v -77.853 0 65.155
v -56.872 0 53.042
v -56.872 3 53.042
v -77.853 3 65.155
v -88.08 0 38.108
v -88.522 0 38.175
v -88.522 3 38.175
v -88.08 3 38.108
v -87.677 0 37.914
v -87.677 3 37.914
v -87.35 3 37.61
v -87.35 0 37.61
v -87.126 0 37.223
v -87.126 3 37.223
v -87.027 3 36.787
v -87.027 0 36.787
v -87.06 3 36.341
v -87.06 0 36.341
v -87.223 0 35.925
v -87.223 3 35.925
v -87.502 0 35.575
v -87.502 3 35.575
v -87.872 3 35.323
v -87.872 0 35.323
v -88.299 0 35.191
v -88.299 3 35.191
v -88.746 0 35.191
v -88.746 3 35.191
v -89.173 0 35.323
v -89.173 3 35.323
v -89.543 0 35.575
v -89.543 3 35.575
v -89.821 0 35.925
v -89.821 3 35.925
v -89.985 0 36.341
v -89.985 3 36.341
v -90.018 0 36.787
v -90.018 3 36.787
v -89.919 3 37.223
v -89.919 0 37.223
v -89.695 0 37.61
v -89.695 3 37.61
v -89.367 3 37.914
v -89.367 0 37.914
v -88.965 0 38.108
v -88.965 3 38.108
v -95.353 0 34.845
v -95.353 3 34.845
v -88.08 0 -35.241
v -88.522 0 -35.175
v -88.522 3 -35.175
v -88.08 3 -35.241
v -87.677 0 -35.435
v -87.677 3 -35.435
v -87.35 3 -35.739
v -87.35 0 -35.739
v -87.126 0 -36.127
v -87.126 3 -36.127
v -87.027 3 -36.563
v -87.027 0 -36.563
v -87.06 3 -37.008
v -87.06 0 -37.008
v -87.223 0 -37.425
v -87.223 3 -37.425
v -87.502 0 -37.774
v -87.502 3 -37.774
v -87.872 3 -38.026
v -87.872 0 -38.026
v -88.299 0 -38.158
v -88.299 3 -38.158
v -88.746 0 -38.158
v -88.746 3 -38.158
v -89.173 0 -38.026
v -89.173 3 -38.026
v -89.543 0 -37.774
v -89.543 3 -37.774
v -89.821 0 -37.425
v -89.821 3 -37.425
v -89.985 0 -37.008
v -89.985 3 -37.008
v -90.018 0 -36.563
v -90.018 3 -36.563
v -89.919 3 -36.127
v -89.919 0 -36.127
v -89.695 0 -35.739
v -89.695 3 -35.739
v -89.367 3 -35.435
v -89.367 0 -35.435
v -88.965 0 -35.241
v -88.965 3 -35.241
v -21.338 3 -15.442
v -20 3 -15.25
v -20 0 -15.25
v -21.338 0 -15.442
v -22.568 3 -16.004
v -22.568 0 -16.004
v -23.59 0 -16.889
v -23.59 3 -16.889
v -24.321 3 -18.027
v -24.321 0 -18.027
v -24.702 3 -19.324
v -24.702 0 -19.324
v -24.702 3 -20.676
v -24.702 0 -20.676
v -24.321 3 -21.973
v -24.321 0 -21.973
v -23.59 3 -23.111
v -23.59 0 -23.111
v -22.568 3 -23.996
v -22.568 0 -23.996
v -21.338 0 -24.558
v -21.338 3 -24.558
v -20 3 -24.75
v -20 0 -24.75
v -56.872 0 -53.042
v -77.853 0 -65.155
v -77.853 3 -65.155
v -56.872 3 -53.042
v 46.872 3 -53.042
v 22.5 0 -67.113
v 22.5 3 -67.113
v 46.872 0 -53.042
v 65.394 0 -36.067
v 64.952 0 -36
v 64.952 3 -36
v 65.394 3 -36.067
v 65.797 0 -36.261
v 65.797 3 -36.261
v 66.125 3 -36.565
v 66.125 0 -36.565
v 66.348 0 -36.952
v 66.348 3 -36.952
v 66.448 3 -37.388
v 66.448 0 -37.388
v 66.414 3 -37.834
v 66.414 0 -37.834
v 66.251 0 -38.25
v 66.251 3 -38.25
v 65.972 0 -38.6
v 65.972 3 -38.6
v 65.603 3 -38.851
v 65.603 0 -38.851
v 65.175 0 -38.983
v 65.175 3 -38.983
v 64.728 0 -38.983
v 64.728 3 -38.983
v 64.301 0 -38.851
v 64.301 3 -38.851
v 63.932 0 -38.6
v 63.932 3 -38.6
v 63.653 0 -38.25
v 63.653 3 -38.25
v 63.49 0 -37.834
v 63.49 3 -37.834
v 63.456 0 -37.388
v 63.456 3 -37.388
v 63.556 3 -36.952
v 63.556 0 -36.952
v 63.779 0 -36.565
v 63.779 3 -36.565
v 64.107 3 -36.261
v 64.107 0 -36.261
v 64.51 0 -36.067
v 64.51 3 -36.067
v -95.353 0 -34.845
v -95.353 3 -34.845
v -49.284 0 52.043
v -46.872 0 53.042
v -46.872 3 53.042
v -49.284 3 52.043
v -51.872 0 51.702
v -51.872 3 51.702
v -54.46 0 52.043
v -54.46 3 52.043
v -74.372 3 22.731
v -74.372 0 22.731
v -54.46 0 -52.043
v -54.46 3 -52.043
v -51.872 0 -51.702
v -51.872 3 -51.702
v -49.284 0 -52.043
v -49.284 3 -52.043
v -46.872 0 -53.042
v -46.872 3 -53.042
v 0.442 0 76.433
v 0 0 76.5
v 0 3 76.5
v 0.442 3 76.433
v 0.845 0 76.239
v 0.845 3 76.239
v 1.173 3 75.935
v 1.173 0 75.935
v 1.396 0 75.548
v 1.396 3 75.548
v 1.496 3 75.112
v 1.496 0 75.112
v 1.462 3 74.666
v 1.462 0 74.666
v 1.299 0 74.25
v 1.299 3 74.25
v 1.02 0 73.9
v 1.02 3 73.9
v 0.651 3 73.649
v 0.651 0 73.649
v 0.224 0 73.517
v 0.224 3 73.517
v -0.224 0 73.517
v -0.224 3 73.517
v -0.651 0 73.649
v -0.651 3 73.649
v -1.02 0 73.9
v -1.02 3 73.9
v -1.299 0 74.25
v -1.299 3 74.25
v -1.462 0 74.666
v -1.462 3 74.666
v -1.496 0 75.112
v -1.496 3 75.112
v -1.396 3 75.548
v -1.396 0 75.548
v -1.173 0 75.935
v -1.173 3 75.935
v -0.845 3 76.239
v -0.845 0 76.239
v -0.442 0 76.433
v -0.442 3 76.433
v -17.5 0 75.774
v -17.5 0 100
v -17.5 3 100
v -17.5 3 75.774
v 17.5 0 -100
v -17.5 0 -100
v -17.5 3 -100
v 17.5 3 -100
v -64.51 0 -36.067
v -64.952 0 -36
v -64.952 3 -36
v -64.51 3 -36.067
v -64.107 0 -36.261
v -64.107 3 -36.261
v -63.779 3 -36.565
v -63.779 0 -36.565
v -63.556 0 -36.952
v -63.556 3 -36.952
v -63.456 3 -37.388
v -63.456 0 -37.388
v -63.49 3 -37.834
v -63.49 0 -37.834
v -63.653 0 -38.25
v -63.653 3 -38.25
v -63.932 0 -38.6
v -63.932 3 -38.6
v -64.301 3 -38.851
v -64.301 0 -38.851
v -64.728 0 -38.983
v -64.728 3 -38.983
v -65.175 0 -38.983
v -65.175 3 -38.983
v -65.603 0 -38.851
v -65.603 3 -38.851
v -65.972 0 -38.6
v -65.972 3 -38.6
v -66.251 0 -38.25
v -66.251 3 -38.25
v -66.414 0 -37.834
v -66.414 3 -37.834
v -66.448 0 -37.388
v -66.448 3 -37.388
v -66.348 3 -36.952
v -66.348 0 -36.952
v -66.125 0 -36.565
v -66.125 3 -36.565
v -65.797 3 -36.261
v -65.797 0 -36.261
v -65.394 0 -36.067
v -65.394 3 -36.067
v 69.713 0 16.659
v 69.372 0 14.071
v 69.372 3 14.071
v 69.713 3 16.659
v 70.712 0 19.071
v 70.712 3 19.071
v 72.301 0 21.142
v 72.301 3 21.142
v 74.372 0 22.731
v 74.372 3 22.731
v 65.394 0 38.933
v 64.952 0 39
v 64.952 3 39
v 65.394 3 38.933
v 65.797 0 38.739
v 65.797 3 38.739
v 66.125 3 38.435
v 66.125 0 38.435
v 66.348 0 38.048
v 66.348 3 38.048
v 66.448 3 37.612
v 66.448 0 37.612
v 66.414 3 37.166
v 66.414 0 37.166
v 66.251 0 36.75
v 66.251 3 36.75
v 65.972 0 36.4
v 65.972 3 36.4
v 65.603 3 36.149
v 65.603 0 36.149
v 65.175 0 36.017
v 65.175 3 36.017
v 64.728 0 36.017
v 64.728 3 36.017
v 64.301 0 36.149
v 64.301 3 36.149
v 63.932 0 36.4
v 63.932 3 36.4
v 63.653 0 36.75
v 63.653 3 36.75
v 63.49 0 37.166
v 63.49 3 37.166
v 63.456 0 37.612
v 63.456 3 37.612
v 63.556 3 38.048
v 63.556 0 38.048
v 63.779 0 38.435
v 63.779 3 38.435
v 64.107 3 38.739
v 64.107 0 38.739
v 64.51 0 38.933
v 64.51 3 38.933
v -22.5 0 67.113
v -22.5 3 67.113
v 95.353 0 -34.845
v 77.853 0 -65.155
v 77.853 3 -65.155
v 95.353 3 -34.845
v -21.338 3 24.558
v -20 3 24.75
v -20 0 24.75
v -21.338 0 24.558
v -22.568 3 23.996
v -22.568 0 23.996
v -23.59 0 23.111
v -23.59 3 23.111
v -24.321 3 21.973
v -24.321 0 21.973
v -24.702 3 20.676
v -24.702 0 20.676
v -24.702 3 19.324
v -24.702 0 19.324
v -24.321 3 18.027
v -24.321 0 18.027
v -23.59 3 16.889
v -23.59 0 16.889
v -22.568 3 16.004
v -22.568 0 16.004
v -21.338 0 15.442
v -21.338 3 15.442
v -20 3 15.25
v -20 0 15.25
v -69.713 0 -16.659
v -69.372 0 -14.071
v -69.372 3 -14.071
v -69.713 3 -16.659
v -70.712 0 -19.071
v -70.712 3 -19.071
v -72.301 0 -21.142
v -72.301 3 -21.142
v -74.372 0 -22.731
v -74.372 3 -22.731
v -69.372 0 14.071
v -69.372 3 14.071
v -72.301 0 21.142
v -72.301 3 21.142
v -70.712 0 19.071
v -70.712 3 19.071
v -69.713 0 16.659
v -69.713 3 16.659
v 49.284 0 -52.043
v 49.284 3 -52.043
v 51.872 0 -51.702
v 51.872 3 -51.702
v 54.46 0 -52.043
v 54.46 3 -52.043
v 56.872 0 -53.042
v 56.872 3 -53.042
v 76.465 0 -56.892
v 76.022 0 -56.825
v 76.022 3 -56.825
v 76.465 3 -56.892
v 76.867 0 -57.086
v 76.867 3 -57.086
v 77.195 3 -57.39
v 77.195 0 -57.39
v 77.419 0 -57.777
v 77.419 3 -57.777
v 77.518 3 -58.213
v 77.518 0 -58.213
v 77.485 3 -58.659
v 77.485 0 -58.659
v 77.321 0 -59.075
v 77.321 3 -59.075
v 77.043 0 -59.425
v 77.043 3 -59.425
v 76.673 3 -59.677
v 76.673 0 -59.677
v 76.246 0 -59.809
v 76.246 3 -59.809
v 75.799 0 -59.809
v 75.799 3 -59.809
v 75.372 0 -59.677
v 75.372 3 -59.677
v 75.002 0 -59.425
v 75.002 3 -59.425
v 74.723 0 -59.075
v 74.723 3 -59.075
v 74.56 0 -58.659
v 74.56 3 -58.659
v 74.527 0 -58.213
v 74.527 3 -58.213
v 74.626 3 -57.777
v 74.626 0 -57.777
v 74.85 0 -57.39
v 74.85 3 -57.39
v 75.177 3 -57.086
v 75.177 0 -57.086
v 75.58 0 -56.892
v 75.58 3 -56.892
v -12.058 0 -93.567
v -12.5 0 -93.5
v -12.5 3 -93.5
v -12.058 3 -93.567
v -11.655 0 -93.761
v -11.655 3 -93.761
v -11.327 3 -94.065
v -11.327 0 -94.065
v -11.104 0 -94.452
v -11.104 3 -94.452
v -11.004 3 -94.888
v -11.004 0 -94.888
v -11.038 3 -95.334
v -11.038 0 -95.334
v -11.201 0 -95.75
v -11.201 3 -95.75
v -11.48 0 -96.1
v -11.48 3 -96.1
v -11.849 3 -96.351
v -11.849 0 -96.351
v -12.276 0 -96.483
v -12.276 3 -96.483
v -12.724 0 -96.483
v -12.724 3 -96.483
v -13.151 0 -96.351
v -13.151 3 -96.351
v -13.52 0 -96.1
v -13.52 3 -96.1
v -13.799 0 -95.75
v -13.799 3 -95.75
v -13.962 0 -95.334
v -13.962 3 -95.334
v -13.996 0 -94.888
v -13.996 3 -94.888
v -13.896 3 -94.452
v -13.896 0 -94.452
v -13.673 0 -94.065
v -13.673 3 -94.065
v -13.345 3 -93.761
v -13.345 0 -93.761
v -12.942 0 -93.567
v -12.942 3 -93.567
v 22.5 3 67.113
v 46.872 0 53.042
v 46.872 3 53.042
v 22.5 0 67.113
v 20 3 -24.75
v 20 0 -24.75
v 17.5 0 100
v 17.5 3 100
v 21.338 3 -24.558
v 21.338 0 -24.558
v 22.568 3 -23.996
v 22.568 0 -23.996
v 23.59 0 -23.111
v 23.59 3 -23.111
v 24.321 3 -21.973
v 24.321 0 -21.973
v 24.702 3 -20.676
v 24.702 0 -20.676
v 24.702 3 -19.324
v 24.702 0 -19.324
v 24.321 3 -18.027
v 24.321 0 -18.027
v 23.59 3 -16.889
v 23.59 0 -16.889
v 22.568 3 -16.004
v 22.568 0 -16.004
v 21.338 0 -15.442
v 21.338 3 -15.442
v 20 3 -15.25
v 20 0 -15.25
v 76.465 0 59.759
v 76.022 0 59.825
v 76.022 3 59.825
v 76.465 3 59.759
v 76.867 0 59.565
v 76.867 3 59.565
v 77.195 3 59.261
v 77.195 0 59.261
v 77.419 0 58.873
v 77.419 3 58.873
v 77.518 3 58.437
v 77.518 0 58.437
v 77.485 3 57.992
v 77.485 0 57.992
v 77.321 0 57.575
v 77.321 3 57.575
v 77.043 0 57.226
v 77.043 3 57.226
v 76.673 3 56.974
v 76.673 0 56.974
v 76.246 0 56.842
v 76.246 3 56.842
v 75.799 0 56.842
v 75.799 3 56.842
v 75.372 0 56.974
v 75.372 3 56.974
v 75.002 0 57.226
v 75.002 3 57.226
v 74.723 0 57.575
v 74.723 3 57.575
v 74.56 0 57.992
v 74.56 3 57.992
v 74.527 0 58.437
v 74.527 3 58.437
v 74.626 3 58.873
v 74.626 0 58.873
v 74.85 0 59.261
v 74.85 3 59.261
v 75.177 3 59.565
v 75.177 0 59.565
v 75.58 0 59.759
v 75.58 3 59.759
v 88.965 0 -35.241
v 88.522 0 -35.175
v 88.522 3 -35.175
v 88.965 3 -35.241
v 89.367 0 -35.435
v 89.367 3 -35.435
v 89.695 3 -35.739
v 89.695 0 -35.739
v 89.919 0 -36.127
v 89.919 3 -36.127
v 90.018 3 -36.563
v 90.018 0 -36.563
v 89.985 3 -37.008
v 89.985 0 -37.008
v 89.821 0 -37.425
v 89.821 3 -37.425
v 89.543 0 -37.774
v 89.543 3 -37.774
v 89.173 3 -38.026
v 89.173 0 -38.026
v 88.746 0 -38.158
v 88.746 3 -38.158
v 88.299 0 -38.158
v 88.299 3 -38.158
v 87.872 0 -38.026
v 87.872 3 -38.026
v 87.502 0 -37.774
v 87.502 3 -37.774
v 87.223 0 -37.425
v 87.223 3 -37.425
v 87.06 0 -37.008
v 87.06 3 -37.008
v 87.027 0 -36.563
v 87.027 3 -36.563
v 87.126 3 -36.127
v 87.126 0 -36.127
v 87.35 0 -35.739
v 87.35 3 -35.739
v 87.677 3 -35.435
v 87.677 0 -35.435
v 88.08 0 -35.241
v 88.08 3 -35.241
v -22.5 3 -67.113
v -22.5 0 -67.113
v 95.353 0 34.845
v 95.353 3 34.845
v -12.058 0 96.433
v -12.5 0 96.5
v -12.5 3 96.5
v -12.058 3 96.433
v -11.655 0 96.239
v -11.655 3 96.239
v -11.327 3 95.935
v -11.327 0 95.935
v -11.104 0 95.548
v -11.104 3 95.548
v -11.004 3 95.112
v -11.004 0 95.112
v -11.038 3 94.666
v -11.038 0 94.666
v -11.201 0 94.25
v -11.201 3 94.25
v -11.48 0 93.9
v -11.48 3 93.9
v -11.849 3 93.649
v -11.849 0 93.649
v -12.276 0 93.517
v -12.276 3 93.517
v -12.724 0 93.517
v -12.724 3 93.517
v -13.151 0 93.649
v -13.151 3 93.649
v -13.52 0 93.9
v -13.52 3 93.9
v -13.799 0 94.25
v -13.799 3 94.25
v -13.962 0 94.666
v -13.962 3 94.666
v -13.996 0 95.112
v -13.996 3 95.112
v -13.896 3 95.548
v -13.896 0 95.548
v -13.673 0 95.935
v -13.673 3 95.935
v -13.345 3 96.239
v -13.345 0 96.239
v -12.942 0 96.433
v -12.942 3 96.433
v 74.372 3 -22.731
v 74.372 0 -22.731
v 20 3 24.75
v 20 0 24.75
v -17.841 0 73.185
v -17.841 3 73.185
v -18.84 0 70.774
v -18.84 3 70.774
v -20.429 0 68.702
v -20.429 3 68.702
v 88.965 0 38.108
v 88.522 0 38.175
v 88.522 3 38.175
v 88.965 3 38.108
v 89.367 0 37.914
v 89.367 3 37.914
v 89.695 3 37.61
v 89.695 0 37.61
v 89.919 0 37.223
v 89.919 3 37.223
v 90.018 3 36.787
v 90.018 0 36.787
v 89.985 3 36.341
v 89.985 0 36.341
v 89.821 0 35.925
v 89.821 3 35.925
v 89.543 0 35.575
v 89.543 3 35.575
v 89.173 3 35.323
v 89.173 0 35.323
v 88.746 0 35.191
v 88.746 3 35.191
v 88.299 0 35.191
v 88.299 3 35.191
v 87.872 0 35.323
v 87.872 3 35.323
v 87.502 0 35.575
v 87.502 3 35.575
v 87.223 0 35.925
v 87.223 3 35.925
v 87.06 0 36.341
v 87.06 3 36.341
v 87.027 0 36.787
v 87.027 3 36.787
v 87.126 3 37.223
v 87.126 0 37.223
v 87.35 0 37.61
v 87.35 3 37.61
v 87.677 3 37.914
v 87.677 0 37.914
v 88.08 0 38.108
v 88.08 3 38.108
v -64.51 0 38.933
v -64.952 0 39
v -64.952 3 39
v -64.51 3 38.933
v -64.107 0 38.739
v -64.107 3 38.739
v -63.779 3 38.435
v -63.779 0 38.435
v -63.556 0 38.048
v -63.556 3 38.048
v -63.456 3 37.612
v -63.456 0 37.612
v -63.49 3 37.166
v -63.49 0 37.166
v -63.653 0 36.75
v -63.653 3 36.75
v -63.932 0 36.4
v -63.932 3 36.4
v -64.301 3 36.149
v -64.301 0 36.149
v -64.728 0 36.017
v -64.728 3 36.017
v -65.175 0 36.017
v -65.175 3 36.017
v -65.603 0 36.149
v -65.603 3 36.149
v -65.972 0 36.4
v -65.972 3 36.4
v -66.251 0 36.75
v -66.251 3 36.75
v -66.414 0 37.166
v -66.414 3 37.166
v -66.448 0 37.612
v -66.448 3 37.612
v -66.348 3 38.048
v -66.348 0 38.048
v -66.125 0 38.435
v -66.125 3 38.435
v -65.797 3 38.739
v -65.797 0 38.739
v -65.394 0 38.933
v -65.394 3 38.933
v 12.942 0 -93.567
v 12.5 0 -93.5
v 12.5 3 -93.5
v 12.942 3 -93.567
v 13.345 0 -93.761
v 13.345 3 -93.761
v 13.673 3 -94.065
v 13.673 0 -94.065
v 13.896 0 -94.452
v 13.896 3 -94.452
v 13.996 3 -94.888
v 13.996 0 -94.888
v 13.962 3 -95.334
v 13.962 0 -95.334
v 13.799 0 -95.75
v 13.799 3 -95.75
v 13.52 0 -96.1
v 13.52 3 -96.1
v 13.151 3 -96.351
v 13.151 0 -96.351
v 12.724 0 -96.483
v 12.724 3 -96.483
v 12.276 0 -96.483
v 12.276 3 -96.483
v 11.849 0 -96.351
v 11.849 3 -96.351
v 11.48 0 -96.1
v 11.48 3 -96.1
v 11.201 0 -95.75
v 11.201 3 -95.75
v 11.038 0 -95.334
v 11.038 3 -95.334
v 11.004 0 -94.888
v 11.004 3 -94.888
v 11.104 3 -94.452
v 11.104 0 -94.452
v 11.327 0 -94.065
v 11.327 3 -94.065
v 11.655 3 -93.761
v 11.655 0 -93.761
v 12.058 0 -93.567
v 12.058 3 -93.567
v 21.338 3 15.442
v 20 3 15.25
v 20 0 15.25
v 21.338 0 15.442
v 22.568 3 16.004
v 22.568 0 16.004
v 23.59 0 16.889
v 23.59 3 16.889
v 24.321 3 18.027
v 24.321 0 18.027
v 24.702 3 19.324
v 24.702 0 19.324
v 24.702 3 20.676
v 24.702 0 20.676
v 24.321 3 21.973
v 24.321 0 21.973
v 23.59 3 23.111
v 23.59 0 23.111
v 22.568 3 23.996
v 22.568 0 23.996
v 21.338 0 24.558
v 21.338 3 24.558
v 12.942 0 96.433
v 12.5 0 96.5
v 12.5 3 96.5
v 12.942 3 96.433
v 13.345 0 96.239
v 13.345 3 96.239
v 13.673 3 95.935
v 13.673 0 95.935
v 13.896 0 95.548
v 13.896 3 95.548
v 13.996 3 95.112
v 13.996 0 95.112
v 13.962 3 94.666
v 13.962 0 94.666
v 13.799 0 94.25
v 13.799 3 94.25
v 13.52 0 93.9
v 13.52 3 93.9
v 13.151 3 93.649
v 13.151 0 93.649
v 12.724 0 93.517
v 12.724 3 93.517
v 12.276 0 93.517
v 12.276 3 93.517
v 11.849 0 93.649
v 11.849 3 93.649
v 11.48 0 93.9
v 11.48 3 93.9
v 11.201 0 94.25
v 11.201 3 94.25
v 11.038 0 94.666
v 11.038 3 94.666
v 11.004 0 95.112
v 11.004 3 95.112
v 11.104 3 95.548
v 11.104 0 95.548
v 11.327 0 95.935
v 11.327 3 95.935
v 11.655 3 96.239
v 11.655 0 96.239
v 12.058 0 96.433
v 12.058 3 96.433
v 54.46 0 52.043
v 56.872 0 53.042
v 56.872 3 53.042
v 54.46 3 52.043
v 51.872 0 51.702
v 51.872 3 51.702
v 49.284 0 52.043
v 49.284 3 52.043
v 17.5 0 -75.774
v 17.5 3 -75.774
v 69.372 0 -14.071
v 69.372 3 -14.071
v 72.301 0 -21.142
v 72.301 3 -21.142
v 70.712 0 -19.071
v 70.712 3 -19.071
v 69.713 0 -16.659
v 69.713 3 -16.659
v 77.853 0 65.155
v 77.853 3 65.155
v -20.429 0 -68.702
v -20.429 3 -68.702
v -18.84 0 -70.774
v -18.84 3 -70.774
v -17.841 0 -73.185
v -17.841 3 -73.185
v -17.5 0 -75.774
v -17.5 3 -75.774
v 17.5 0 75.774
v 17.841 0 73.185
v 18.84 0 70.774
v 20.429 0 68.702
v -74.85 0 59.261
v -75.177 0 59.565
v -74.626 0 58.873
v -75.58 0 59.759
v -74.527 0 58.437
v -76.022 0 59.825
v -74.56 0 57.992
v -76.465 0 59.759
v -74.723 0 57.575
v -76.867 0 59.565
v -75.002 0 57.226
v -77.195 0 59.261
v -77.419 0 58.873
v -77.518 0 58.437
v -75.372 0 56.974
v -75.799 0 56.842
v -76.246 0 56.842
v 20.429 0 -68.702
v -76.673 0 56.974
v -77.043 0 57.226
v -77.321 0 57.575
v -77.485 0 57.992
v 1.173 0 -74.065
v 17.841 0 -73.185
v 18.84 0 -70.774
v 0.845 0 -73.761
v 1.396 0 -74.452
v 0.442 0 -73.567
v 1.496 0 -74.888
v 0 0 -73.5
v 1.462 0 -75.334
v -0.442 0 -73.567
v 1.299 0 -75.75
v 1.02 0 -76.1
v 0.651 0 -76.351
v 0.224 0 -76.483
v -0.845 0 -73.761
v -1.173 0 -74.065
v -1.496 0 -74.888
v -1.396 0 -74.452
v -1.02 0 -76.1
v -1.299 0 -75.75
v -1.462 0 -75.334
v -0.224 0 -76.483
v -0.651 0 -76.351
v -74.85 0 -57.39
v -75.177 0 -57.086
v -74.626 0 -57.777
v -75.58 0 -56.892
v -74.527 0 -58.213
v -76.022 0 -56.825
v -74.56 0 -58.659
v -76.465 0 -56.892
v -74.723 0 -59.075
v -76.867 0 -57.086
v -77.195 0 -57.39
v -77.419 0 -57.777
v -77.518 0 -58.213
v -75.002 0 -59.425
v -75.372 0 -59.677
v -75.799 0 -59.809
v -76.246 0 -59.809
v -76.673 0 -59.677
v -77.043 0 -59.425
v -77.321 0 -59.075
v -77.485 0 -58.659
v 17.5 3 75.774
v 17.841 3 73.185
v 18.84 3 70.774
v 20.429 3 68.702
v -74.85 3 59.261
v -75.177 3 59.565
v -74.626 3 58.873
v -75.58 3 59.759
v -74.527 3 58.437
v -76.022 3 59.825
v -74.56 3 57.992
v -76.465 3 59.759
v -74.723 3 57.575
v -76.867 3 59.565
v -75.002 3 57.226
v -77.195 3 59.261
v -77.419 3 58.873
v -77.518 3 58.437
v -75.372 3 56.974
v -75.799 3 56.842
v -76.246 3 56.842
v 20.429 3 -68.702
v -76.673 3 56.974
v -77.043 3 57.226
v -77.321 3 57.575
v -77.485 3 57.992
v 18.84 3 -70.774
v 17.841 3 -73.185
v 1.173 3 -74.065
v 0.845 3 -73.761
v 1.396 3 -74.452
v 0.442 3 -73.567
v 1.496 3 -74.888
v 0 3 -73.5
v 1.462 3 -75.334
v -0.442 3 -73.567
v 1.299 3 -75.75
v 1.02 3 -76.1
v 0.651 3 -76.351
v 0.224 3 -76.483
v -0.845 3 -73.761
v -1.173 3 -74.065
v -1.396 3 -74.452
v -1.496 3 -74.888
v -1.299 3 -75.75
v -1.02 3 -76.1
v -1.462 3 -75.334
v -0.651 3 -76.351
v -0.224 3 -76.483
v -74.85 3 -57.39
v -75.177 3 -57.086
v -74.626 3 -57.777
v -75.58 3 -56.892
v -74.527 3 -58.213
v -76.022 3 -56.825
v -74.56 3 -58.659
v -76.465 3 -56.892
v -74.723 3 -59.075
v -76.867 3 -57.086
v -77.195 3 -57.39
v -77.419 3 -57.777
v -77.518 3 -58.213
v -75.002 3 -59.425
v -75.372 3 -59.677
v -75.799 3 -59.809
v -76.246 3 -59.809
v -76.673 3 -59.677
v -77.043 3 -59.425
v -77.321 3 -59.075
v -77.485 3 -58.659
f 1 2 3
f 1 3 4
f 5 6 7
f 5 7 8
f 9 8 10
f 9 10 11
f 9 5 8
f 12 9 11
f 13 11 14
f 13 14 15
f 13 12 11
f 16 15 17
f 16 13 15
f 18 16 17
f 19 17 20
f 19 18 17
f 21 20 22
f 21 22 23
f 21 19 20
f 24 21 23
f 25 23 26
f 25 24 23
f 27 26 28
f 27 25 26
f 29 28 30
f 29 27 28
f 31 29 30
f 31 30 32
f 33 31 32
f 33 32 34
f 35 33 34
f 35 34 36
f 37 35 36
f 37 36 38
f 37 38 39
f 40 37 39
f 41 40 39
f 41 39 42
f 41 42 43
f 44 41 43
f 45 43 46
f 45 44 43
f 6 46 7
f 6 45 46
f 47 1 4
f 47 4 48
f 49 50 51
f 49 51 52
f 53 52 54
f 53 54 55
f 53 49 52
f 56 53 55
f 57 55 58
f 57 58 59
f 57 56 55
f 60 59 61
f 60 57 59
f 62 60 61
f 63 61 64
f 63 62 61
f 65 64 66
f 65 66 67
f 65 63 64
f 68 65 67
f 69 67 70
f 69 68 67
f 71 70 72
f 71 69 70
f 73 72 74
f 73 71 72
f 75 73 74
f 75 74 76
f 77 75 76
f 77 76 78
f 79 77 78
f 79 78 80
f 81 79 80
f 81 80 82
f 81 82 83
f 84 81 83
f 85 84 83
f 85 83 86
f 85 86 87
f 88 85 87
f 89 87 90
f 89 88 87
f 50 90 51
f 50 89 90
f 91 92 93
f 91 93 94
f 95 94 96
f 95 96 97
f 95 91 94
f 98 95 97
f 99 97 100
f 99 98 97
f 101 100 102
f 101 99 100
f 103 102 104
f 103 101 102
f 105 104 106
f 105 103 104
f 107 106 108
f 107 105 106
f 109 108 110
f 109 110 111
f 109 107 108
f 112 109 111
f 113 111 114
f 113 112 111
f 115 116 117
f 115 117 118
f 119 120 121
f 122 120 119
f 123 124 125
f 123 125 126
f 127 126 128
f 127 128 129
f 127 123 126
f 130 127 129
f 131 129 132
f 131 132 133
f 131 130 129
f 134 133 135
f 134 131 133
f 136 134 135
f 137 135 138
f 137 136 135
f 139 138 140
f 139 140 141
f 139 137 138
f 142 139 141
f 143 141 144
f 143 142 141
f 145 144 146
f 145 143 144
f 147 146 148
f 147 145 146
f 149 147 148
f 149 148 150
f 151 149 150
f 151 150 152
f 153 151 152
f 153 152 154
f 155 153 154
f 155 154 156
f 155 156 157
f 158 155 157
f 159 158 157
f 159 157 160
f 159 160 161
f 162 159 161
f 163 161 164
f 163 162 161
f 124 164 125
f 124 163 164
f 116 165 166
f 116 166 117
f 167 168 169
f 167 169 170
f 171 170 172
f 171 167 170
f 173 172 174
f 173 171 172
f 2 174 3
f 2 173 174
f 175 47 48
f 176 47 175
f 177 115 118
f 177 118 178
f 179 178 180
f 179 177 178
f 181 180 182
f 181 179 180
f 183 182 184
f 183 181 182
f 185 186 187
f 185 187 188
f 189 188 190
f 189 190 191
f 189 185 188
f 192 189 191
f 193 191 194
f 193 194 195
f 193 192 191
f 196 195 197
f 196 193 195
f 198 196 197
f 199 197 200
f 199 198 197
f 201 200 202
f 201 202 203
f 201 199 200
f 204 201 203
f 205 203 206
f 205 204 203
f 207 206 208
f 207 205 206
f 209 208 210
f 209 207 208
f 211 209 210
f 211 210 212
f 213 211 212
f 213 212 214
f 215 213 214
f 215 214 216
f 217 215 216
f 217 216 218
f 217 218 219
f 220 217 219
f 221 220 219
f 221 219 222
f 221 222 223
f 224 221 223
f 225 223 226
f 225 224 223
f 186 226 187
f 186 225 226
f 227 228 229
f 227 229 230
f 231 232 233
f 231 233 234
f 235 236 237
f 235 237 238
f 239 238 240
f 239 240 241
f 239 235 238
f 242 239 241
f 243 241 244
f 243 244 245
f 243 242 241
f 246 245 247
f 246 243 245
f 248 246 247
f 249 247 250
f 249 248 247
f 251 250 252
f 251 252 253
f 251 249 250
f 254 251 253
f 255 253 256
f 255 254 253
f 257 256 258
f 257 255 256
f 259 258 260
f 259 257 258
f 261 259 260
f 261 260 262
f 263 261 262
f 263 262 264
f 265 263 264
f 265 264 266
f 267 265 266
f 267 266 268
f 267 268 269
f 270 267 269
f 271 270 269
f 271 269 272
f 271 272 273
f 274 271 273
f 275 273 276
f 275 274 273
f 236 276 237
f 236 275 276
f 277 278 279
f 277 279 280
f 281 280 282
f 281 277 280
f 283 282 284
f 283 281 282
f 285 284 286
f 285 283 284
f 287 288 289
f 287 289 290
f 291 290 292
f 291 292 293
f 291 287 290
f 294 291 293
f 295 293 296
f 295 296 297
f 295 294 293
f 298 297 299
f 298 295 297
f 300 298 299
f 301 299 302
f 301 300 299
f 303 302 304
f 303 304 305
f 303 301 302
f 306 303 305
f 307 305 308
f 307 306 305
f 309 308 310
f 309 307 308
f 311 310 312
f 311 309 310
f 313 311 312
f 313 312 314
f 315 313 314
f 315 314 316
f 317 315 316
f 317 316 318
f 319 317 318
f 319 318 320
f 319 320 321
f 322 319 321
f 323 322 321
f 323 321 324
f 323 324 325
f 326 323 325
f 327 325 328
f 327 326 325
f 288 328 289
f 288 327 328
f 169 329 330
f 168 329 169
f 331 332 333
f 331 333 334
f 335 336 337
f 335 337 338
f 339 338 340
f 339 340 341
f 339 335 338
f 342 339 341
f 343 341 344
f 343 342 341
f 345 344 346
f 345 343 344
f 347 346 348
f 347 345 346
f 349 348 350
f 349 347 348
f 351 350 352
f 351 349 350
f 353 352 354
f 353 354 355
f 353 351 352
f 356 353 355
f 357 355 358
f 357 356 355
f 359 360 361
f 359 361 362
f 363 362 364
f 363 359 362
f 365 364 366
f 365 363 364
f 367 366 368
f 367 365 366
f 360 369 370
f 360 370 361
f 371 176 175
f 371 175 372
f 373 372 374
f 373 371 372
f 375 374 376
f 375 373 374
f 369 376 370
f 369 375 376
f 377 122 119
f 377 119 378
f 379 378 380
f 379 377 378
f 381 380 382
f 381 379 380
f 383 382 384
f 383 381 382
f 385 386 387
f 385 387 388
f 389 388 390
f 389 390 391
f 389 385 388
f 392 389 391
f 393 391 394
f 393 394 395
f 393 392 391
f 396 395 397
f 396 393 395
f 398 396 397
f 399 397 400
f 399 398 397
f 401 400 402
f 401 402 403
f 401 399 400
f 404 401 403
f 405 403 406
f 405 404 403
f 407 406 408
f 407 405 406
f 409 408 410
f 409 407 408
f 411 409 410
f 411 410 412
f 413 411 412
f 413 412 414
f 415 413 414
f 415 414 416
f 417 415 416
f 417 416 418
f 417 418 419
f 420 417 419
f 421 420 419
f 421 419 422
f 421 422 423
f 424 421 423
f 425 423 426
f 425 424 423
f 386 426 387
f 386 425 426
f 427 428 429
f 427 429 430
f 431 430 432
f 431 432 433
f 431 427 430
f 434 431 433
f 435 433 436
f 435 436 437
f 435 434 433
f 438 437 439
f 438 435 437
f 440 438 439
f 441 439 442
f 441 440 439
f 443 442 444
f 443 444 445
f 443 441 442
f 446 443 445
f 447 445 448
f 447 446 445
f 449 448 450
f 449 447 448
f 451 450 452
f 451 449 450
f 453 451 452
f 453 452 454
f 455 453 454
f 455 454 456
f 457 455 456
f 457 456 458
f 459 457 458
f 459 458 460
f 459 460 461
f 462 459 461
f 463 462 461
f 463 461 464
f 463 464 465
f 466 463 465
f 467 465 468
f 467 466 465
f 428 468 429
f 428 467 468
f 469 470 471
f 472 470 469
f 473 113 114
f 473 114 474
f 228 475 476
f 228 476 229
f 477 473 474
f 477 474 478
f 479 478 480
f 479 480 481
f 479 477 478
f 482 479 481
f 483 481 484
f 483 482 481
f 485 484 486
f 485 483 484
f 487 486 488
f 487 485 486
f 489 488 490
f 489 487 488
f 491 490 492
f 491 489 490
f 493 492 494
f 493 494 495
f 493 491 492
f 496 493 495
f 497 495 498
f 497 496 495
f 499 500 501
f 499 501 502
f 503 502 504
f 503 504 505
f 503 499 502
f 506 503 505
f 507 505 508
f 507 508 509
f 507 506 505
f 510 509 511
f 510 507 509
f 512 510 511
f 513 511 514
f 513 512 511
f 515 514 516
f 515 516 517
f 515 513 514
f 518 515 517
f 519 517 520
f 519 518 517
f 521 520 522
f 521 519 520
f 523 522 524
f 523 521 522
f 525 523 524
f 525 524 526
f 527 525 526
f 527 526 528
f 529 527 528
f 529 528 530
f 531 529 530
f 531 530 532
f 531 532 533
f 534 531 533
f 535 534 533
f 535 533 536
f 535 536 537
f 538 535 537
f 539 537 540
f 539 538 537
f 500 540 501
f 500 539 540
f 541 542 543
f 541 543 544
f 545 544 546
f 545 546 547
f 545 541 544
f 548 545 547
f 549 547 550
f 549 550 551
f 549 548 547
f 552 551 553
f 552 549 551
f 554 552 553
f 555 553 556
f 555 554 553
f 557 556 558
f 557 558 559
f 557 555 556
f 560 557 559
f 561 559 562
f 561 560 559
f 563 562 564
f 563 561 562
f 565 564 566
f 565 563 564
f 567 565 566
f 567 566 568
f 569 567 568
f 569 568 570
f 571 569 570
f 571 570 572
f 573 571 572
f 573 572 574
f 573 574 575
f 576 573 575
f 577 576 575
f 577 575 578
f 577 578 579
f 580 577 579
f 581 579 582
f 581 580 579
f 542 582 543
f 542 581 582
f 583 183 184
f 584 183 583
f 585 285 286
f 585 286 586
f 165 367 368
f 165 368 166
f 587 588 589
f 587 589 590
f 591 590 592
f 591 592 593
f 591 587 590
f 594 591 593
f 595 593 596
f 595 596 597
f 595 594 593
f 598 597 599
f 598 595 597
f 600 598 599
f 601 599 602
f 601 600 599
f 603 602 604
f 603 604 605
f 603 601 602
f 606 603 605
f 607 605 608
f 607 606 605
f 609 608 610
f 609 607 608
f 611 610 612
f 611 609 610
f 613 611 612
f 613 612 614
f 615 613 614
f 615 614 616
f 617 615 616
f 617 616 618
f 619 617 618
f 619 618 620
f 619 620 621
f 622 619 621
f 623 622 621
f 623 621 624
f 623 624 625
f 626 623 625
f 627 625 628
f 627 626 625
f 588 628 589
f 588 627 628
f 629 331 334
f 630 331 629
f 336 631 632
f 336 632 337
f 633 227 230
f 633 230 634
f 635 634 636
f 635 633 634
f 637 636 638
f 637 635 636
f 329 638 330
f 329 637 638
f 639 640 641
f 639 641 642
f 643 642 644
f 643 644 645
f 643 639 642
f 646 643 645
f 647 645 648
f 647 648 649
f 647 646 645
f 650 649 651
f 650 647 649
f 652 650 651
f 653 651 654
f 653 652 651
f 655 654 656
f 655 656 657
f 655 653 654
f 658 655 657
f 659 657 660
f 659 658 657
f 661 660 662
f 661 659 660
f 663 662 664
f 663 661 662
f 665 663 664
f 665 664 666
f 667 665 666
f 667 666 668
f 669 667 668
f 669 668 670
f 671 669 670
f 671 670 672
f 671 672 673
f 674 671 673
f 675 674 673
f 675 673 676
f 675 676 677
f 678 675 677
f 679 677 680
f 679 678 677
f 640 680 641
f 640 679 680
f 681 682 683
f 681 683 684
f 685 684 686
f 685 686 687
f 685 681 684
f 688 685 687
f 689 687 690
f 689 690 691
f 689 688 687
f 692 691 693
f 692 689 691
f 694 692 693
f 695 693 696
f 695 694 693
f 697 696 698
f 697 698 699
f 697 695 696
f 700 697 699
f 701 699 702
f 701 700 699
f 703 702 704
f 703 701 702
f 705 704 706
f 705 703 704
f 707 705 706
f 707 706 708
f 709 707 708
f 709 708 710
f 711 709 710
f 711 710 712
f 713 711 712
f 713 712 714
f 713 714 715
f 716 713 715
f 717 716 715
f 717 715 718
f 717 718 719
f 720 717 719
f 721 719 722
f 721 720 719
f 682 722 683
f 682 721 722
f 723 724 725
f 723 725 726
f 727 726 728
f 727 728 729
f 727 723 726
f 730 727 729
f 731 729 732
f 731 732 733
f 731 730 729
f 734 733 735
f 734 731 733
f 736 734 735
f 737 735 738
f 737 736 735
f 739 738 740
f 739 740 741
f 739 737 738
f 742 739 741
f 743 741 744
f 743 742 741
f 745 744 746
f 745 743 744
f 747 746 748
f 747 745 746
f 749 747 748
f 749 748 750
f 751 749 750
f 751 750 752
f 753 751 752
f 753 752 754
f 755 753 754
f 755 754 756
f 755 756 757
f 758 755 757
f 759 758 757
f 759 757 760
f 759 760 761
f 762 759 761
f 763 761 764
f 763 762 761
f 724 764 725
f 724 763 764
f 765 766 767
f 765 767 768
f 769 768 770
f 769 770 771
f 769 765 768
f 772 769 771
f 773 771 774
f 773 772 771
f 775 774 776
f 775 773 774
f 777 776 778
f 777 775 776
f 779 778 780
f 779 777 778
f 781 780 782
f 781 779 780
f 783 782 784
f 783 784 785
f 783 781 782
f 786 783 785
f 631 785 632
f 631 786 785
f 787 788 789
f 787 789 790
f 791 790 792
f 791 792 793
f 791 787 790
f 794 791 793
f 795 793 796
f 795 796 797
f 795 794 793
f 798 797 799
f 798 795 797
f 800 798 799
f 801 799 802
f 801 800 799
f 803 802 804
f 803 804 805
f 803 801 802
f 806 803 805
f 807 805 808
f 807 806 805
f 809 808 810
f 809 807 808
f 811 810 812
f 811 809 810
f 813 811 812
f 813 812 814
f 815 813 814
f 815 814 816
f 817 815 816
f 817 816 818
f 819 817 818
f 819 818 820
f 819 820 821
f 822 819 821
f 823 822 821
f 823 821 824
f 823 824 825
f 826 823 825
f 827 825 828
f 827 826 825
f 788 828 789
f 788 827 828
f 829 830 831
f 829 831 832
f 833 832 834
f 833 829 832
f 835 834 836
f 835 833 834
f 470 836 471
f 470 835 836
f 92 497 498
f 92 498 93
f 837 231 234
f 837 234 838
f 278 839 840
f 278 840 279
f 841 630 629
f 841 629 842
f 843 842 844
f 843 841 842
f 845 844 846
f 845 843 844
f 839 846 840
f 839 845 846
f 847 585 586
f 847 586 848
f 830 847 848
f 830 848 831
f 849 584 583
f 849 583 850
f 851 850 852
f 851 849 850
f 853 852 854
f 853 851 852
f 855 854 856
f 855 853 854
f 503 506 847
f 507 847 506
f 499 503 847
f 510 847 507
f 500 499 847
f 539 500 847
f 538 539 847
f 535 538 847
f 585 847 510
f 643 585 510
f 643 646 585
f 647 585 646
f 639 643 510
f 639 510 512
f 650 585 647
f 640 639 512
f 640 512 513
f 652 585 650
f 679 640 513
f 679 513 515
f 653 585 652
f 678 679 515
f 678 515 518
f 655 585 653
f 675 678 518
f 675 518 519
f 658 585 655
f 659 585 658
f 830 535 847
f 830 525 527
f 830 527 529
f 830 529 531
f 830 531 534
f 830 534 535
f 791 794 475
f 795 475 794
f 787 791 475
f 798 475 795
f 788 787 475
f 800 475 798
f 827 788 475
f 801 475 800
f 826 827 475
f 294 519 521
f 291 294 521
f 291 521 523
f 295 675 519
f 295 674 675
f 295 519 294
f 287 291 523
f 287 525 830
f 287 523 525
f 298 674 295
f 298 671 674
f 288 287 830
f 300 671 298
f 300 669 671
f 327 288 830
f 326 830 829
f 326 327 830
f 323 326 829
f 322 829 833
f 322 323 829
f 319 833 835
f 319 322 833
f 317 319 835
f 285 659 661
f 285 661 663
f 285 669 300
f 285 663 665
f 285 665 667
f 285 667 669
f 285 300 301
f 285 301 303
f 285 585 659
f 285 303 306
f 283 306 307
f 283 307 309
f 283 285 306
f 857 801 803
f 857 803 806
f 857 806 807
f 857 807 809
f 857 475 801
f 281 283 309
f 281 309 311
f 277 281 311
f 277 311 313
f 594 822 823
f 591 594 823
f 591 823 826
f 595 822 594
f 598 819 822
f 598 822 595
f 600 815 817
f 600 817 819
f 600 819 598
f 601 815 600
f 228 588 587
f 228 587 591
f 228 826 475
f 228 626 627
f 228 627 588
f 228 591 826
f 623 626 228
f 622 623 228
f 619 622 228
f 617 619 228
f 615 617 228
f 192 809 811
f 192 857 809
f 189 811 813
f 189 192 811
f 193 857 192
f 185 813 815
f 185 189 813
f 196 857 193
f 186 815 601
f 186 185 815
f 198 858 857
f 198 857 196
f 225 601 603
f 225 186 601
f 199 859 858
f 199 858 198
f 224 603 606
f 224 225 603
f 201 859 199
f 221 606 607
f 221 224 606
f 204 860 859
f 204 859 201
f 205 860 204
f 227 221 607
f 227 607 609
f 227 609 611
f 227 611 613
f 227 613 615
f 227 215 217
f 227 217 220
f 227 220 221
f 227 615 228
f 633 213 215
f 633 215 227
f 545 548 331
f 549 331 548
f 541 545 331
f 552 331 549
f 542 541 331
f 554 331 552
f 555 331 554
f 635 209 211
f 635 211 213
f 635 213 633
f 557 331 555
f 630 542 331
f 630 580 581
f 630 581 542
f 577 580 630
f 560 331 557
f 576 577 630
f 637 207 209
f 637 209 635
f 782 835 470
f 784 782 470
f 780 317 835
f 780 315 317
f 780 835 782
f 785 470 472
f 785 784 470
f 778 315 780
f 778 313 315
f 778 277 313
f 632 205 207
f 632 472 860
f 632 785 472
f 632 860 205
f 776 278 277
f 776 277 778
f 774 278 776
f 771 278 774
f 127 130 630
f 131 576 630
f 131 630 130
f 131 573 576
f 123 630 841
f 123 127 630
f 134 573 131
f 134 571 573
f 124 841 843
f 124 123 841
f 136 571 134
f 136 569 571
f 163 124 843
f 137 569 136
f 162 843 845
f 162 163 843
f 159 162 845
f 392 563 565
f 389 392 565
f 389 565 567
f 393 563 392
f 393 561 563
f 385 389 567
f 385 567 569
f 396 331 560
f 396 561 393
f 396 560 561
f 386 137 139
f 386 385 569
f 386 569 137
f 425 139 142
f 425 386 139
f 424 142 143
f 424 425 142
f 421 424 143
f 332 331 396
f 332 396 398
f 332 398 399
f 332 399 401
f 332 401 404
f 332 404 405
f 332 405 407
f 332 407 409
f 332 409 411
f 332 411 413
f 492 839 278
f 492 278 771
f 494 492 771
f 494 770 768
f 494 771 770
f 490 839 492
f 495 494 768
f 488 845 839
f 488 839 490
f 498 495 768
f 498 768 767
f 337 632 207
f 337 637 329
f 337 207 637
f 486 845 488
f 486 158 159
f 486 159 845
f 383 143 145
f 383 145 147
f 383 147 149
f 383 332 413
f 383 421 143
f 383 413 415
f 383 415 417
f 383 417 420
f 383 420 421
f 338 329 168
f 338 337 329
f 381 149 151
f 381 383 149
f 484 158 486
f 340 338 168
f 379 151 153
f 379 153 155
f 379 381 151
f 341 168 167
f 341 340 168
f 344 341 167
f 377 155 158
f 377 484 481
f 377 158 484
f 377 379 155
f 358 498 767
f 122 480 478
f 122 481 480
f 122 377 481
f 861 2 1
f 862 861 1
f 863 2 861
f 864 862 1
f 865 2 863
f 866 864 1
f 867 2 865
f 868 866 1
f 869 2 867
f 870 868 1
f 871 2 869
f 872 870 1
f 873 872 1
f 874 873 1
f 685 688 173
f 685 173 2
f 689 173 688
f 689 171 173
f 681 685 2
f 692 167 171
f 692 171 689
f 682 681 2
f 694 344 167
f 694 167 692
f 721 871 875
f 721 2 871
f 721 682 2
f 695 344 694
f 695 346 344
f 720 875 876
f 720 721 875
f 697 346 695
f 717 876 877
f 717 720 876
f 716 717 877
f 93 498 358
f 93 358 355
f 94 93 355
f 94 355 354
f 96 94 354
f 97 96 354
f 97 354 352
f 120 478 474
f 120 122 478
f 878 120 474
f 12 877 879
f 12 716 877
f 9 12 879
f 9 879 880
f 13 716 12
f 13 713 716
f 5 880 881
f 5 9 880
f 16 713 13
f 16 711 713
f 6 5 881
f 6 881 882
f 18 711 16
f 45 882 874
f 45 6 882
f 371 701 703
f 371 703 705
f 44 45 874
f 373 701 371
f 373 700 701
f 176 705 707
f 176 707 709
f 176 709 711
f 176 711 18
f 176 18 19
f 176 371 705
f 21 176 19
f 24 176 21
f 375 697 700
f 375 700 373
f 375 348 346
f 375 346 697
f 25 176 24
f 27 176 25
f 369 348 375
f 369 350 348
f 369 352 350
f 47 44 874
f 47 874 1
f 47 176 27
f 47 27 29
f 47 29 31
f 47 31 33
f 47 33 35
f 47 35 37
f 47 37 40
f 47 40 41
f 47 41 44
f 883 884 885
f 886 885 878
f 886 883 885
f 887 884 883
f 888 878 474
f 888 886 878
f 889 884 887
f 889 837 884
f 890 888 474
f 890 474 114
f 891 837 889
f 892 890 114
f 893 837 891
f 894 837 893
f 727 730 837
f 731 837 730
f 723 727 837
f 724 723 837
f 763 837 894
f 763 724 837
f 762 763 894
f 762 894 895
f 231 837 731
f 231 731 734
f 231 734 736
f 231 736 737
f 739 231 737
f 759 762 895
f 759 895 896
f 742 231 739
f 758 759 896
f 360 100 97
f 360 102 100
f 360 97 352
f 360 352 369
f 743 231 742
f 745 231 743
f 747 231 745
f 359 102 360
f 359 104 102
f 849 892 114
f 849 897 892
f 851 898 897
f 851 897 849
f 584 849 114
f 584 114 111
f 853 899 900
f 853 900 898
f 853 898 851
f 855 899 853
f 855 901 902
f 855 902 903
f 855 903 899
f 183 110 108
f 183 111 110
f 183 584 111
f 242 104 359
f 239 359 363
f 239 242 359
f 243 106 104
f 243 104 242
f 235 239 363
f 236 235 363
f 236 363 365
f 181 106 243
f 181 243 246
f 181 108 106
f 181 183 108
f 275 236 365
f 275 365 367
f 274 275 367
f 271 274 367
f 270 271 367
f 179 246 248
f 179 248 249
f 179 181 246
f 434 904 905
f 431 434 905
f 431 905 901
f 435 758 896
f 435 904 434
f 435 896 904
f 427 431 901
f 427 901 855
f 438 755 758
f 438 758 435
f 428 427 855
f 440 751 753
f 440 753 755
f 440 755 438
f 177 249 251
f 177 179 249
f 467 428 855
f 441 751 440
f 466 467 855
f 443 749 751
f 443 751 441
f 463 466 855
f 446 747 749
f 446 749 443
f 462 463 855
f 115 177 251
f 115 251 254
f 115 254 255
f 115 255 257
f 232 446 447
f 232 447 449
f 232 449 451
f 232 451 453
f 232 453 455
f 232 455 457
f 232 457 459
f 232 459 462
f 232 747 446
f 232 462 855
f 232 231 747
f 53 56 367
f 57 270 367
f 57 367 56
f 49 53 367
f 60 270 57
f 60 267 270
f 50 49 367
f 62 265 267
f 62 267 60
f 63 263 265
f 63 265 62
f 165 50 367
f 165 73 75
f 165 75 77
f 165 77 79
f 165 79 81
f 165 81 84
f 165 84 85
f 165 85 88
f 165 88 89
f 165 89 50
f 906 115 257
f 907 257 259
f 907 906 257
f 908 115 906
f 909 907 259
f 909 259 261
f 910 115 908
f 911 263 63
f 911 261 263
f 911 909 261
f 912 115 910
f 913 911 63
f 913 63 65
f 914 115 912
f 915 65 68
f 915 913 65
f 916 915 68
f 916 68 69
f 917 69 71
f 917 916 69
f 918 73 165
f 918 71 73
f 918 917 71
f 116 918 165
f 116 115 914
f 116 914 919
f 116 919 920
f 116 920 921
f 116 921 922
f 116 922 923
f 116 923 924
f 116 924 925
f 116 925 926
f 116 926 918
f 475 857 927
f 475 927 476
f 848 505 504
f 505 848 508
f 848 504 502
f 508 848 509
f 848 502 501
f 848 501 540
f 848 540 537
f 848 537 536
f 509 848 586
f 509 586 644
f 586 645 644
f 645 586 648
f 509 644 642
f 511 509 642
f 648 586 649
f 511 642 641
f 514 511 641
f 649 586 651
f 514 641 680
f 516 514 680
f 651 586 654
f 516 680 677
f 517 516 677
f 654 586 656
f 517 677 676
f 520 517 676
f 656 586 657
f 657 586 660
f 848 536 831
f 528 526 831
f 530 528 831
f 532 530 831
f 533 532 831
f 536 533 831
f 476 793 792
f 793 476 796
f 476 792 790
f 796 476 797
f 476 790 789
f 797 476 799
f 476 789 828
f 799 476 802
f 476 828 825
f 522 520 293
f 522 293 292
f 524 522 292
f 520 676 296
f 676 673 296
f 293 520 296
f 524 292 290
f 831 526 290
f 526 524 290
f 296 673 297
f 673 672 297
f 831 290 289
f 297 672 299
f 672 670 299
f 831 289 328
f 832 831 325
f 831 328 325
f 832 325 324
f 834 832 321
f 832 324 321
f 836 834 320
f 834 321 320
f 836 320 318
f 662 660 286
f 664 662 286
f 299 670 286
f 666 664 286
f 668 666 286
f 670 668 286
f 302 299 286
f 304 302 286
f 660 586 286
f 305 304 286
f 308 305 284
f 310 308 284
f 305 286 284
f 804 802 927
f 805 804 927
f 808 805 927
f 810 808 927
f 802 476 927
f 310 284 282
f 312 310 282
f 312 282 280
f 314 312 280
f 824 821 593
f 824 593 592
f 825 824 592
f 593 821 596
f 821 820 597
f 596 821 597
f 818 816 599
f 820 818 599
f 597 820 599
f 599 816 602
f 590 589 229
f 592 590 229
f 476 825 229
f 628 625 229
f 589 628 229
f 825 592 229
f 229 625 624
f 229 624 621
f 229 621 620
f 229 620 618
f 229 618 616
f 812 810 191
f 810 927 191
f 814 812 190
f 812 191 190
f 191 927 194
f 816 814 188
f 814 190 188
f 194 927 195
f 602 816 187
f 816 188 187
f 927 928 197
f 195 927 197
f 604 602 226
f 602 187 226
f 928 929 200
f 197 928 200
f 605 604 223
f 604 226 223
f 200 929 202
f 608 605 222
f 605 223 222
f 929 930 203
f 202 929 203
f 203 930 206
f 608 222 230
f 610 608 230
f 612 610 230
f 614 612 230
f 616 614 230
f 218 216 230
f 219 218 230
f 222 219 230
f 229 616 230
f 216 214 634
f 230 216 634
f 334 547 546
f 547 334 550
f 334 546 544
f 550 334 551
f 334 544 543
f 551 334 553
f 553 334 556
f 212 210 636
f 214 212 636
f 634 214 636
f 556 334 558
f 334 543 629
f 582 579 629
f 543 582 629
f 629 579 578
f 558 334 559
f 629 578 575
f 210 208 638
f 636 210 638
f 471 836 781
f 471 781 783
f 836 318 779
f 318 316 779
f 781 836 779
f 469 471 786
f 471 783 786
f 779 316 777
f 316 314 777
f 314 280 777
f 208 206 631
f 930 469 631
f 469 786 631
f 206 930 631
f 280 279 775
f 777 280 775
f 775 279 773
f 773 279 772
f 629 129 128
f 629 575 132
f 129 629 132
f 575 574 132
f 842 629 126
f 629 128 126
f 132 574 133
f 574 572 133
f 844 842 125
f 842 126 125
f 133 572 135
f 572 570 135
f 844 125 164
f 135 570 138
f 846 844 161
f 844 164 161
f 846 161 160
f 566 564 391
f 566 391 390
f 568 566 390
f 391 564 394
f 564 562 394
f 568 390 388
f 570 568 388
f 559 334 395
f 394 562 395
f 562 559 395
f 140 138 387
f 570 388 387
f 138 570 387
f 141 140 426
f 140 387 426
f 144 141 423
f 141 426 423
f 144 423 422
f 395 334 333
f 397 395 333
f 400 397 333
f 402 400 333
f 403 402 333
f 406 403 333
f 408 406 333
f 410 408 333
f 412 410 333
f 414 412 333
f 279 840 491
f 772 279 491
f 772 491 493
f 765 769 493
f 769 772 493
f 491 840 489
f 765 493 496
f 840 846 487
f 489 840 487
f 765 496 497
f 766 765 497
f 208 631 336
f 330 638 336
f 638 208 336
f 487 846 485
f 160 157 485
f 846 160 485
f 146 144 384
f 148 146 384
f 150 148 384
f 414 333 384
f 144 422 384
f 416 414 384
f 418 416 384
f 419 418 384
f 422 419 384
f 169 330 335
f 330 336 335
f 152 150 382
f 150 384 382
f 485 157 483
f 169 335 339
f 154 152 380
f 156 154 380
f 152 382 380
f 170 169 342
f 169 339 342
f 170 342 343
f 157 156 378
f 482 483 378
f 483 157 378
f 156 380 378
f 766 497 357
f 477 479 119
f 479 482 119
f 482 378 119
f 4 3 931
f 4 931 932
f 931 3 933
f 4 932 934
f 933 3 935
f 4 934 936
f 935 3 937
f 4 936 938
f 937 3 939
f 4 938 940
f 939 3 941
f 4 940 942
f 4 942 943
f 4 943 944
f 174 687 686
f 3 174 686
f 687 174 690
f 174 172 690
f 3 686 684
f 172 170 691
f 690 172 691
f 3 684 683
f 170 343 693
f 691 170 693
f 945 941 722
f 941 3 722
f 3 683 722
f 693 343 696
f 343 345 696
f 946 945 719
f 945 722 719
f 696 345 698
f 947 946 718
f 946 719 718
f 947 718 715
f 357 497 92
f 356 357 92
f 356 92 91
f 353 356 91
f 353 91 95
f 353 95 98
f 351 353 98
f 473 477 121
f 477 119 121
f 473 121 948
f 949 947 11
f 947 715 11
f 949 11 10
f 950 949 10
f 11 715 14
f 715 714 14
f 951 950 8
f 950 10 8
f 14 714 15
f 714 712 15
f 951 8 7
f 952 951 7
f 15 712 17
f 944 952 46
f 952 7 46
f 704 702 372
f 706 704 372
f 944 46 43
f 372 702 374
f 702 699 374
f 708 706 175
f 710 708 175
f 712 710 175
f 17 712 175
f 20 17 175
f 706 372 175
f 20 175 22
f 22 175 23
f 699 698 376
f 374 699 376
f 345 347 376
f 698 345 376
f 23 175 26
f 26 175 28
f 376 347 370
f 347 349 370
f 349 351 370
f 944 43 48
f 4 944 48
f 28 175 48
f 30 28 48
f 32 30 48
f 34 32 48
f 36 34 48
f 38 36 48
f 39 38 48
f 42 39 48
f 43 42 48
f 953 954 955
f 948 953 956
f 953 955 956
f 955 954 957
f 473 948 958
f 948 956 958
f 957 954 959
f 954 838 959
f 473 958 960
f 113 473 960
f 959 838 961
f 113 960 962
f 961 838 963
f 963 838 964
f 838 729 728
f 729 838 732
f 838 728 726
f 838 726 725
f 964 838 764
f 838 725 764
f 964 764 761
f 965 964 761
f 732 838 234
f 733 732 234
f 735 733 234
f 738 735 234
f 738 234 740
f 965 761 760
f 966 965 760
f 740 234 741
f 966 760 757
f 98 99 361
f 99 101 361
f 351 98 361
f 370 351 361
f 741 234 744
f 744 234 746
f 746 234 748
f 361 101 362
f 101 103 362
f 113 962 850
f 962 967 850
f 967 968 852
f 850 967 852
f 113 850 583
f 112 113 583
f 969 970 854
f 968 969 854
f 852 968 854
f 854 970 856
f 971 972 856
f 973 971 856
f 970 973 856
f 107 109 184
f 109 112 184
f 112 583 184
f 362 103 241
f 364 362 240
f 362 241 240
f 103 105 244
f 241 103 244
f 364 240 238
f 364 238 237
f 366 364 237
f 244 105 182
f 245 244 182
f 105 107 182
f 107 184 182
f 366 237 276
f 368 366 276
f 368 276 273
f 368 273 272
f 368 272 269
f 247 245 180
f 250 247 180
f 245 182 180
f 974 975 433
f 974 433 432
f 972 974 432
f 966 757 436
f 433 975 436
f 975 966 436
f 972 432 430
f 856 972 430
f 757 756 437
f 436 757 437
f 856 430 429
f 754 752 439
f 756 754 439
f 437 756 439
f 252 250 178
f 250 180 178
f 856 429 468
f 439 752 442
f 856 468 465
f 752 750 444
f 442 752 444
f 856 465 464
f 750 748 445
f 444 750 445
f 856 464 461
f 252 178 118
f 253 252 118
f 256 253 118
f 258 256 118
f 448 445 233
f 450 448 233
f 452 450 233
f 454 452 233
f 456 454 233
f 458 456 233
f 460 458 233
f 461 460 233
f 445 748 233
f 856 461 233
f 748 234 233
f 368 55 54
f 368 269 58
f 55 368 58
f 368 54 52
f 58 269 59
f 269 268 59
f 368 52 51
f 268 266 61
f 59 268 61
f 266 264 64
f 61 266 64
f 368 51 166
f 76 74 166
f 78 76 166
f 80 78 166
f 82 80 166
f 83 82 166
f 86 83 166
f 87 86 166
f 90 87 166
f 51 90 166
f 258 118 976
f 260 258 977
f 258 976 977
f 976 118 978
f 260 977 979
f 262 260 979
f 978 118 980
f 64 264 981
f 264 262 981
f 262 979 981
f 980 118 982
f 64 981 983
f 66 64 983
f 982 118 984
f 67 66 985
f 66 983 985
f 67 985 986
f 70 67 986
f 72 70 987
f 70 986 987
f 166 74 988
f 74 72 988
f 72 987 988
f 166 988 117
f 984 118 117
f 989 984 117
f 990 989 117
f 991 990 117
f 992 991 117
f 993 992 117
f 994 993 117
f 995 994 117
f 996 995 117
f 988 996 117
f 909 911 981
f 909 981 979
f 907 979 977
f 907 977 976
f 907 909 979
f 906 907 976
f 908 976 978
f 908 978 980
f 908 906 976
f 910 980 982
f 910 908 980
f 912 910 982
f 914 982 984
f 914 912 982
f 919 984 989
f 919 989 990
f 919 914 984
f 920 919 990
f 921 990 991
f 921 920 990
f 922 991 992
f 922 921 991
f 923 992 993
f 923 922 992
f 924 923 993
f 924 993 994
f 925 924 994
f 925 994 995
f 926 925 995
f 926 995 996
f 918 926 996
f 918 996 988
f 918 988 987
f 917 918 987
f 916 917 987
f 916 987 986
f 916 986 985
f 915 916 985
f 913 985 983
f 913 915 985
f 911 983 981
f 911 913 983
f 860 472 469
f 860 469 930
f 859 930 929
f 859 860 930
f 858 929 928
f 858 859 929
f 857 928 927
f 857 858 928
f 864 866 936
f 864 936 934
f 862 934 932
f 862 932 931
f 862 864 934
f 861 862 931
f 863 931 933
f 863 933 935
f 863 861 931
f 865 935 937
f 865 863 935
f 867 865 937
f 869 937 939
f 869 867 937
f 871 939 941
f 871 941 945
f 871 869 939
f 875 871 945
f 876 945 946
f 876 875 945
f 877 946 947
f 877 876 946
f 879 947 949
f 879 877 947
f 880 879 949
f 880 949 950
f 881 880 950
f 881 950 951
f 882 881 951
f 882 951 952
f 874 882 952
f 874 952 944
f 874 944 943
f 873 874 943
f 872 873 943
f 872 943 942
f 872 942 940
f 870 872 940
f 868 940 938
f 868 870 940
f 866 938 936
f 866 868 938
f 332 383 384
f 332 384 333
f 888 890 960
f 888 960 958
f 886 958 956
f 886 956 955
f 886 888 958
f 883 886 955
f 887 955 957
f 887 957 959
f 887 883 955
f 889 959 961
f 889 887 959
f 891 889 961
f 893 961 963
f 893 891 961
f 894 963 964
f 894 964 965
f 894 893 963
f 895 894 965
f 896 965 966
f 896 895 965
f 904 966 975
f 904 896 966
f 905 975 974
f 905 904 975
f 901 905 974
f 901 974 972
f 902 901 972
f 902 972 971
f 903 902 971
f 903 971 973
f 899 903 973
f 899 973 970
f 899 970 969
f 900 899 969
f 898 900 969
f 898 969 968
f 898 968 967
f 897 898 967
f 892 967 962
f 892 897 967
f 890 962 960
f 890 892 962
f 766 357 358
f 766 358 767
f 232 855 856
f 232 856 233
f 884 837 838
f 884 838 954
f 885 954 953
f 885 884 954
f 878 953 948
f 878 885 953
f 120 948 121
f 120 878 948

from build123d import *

# Parameters (mm, degrees)
IZIM1_R                     = 1.5
Y_KSEKLIK_EKSTR_ZYON1_DEPTH = 3
KES_EKSTR_ZYON1_DEPTH       = 3


with BuildPart() as part:
    # Çizim1 → Yükseklik-Ekstrüzyon1 (new body)
    with BuildSketch(Plane(origin=(0, 0, 0), x_dir=(1, 0, 0), z_dir=(0, 1, 0))):
        with BuildLine():
            Line((-17.5, 100), (17.5, 100))
            Line((17.5, 100), (17.5, 75.773502692))
            ThreePointArc((17.5, 75.773502692), (18.839745962, 70.773502692), (22.5, 67.113248654))
            Line((22.5, 67.113248654), (46.871778265, 53.042195912))
            ThreePointArc((46.871778265, 53.042195912), (51.871778265, 51.70244995), (56.871778265, 53.042195912))
            Line((56.871778265, 53.042195912), (77.852540378, 65.155444566))
            Line((77.852540378, 65.155444566), (95.352540378, 34.844555434))
            Line((95.352540378, 34.844555434), (74.371778265, 22.73130678))
            ThreePointArc((74.371778265, 22.73130678), (70.711524227, 19.071052742), (69.371778265, 14.071052742))
            Line((69.371778265, 14.071052742), (69.371778265, -14.071052742))
            ThreePointArc((69.371778265, -14.071052742), (70.711524227, -19.071052742), (74.371778265, -22.73130678))
            Line((74.371778265, -22.73130678), (95.352540378, -34.844555434))
            Line((95.352540378, -34.844555434), (77.852540378, -65.155444566))
            Line((77.852540378, -65.155444566), (56.871778265, -53.042195912))
            ThreePointArc((56.871778265, -53.042195912), (51.871778265, -51.70244995), (46.871778265, -53.042195912))
            Line((46.871778265, -53.042195912), (22.5, -67.113248654))
            ThreePointArc((22.5, -67.113248654), (18.839745962, -70.773502692), (17.5, -75.773502692))
            Line((17.5, -75.773502692), (17.5, -100))
            Line((17.5, -100), (-17.5, -100))
            Line((-17.5, -100), (-17.5, -75.773502692))
            ThreePointArc((-17.5, -75.773502692), (-18.839745962, -70.773502692), (-22.5, -67.113248654))
            Line((-22.5, -67.113248654), (-46.871778265, -53.042195912))
            ThreePointArc((-46.871778265, -53.042195912), (-51.871778265, -51.70244995), (-56.871778265, -53.042195912))
            Line((-56.871778265, -53.042195912), (-77.852540378, -65.155444566))
            Line((-77.852540378, -65.155444566), (-95.352540378, -34.844555434))
            Line((-95.352540378, -34.844555434), (-74.371778265, -22.73130678))
            ThreePointArc((-74.371778265, -22.73130678), (-70.711524227, -19.071052742), (-69.371778265, -14.071052742))
            Line((-69.371778265, -14.071052742), (-69.371778265, 14.071052742))
            ThreePointArc((-69.371778265, 14.071052742), (-70.711524227, 19.071052742), (-74.371778265, 22.73130678))
            Line((-74.371778265, 22.73130678), (-95.352540378, 34.844555434))
            Line((-95.352540378, 34.844555434), (-77.852540378, 65.155444566))
            Line((-77.852540378, 65.155444566), (-56.871778265, 53.042195912))
            ThreePointArc((-56.871778265, 53.042195912), (-51.871778265, 51.70244995), (-46.871778265, 53.042195912))
            Line((-46.871778265, 53.042195912), (-22.5, 67.113248654))
            ThreePointArc((-22.5, 67.113248654), (-18.839745962, 70.773502692), (-17.5, 75.773502692))
            Line((-17.5, 75.773502692), (-17.5, 100))
        make_face()
        with Locations(Location((-12.5, 95, 0), (0, 0, 270))):
            Circle(IZIM1_R, mode=Mode.SUBTRACT)
        with Locations(Location((12.5, 95, 0), (0, 0, 270))):
            Circle(IZIM1_R, mode=Mode.SUBTRACT)
        with Locations(Location((0, 75, 0), (0, 0, 270))):
            Circle(IZIM1_R, mode=Mode.SUBTRACT)
        with Locations(Location((64.951905284, 37.5, 0), (0, 0, 270))):
            Circle(IZIM1_R, mode=Mode.SUBTRACT)
        with Locations(Location((88.52241336, 36.674682453, 0), (0, 0, 270))):
            Circle(IZIM1_R, mode=Mode.SUBTRACT)
        with Locations(Location((76.02241336, 58.325317547, 0), (0, 0, 270))):
            Circle(IZIM1_R, mode=Mode.SUBTRACT)
        with Locations(Location((64.951905284, -37.5, 0), (0, 0, 270))):
            Circle(IZIM1_R, mode=Mode.SUBTRACT)
        with Locations(Location((76.02241336, -58.325317547, 0), (0, 0, 270))):
            Circle(IZIM1_R, mode=Mode.SUBTRACT)
        with Locations(Location((88.52241336, -36.674682453, 0), (0, 0, 270))):
            Circle(IZIM1_R, mode=Mode.SUBTRACT)
        with Locations(Location((0, -75, 0), (0, 0, 270))):
            Circle(IZIM1_R, mode=Mode.SUBTRACT)
        with Locations(Location((-12.5, -95, 0), (0, 0, 270))):
            Circle(IZIM1_R, mode=Mode.SUBTRACT)
        with Locations(Location((12.5, -95, 0), (0, 0, 270))):
            Circle(IZIM1_R, mode=Mode.SUBTRACT)
        with Locations(Location((-64.951905284, -37.5, 0), (0, 0, 270))):
            Circle(IZIM1_R, mode=Mode.SUBTRACT)
        with Locations(Location((-88.52241336, -36.674682453, 0), (0, 0, 270))):
            Circle(IZIM1_R, mode=Mode.SUBTRACT)
        with Locations(Location((-76.02241336, -58.325317547, 0), (0, 0, 270))):
            Circle(IZIM1_R, mode=Mode.SUBTRACT)
        with Locations(Location((-64.951905284, 37.5, 0), (0, 0, 270))):
            Circle(IZIM1_R, mode=Mode.SUBTRACT)
        with Locations(Location((-76.02241336, 58.325317547, 0), (0, 0, 270))):
            Circle(IZIM1_R, mode=Mode.SUBTRACT)
        with Locations(Location((-88.52241336, 36.674682453, 0), (0, 0, 270))):
            Circle(IZIM1_R, mode=Mode.SUBTRACT)
    extrude(amount=Y_KSEKLIK_EKSTR_ZYON1_DEPTH)

    # Çizim3 → Kes-Ekstrüzyon1 (cut)
    with BuildSketch(Plane(origin=(0, 3, 0), x_dir=(1, 0, 0), z_dir=(0, 1, 0))):
        with BuildLine():
            Line((-20, 24.75), (20, 24.75))
            ThreePointArc((20, 24.75), (24.75, 20), (20, 15.25))
            Line((20, 15.25), (-20, 15.25))
            ThreePointArc((-20, 15.25), (-24.75, 20), (-20, 24.75))
        make_face()
        with BuildLine():
            Line((-20, -15.25), (20, -15.25))
            ThreePointArc((20, -15.25), (24.75, -20), (20, -24.75))
            Line((20, -24.75), (-20, -24.75))
            ThreePointArc((-20, -24.75), (-24.75, -20), (-20, -15.25))
        make_face()
    extrude(amount=-KES_EKSTR_ZYON1_DEPTH, mode=Mode.SUBTRACT)


solid = part.part
